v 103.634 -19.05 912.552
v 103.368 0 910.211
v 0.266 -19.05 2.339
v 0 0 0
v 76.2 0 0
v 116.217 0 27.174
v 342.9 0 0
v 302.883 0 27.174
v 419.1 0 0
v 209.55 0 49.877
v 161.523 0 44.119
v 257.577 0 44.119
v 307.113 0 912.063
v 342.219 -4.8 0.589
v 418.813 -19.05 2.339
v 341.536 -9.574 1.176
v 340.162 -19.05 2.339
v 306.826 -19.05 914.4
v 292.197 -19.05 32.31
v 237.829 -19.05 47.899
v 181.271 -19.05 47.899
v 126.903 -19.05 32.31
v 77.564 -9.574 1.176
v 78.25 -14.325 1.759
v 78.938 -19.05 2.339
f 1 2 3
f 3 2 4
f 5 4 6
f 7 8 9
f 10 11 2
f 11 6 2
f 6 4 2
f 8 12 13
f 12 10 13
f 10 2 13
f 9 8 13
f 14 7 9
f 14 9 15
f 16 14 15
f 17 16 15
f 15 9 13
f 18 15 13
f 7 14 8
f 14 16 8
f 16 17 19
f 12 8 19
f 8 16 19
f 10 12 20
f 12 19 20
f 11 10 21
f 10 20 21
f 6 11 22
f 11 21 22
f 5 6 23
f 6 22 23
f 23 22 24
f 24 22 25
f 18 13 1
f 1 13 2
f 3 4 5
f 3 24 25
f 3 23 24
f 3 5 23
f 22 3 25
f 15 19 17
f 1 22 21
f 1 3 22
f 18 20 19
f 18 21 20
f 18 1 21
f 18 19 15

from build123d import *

# Parameters (mm, degrees)
F1_DEPTH = 19.05
F3_DEPTH = 19.05
F5_DEPTH = 419.1
F6_SIZE2 = 2.339036
F6_SIZE  = 19.04999


# Not quite as in the source:
# - a fillet or chamfer is up to 0.001 mm smaller than in the source, because OpenCascade refuses the exact size


with BuildPart() as f1:
    # F0 (on Front) → F1 (new body)
    with BuildSketch(Plane.XZ):
        Polygon((306.8257975104, 914.4), (103.6341967715, 912.5524640321), (0, 0), (419.1, 0), align=None)
    extrude(amount=F1_DEPTH)

    # F2 (on face) → F3 (cut)
    with BuildSketch(Plane.XZ.offset(19.05)):
        with BuildLine():
            Line((76.2, 0), (342.9, 0))
            ThreePointArc((342.9, 0), (209.55, 49.8767548608), (76.2, 0))
        make_face()
    extrude(amount=-F3_DEPTH, mode=Mode.SUBTRACT)

    # F4 (on Right) → F5 (cut)
    with BuildSketch(Plane.YZ):
        Polygon((-19.05, 2.3390458852), (-19.05, 0), (0, 0), align=None)
    extrude(amount=F5_DEPTH, mode=Mode.SUBTRACT)

    # F6 (size 19.05 and 2.3390458852 in the source; OpenCascade refuses exactly that, so slightly less here)
    f6_edges = [f1.edges().sort_by_distance(p)[0] for p in [
        (205.229997, 0, 913.476232),
    ]]
    f6_side = f1.faces().sort_by_distance((205.229997, -9.525, 913.476232))[0]
    chamfer(f6_edges, length=F6_SIZE, length2=F6_SIZE2, reference=f6_side)


solid = f1.part
